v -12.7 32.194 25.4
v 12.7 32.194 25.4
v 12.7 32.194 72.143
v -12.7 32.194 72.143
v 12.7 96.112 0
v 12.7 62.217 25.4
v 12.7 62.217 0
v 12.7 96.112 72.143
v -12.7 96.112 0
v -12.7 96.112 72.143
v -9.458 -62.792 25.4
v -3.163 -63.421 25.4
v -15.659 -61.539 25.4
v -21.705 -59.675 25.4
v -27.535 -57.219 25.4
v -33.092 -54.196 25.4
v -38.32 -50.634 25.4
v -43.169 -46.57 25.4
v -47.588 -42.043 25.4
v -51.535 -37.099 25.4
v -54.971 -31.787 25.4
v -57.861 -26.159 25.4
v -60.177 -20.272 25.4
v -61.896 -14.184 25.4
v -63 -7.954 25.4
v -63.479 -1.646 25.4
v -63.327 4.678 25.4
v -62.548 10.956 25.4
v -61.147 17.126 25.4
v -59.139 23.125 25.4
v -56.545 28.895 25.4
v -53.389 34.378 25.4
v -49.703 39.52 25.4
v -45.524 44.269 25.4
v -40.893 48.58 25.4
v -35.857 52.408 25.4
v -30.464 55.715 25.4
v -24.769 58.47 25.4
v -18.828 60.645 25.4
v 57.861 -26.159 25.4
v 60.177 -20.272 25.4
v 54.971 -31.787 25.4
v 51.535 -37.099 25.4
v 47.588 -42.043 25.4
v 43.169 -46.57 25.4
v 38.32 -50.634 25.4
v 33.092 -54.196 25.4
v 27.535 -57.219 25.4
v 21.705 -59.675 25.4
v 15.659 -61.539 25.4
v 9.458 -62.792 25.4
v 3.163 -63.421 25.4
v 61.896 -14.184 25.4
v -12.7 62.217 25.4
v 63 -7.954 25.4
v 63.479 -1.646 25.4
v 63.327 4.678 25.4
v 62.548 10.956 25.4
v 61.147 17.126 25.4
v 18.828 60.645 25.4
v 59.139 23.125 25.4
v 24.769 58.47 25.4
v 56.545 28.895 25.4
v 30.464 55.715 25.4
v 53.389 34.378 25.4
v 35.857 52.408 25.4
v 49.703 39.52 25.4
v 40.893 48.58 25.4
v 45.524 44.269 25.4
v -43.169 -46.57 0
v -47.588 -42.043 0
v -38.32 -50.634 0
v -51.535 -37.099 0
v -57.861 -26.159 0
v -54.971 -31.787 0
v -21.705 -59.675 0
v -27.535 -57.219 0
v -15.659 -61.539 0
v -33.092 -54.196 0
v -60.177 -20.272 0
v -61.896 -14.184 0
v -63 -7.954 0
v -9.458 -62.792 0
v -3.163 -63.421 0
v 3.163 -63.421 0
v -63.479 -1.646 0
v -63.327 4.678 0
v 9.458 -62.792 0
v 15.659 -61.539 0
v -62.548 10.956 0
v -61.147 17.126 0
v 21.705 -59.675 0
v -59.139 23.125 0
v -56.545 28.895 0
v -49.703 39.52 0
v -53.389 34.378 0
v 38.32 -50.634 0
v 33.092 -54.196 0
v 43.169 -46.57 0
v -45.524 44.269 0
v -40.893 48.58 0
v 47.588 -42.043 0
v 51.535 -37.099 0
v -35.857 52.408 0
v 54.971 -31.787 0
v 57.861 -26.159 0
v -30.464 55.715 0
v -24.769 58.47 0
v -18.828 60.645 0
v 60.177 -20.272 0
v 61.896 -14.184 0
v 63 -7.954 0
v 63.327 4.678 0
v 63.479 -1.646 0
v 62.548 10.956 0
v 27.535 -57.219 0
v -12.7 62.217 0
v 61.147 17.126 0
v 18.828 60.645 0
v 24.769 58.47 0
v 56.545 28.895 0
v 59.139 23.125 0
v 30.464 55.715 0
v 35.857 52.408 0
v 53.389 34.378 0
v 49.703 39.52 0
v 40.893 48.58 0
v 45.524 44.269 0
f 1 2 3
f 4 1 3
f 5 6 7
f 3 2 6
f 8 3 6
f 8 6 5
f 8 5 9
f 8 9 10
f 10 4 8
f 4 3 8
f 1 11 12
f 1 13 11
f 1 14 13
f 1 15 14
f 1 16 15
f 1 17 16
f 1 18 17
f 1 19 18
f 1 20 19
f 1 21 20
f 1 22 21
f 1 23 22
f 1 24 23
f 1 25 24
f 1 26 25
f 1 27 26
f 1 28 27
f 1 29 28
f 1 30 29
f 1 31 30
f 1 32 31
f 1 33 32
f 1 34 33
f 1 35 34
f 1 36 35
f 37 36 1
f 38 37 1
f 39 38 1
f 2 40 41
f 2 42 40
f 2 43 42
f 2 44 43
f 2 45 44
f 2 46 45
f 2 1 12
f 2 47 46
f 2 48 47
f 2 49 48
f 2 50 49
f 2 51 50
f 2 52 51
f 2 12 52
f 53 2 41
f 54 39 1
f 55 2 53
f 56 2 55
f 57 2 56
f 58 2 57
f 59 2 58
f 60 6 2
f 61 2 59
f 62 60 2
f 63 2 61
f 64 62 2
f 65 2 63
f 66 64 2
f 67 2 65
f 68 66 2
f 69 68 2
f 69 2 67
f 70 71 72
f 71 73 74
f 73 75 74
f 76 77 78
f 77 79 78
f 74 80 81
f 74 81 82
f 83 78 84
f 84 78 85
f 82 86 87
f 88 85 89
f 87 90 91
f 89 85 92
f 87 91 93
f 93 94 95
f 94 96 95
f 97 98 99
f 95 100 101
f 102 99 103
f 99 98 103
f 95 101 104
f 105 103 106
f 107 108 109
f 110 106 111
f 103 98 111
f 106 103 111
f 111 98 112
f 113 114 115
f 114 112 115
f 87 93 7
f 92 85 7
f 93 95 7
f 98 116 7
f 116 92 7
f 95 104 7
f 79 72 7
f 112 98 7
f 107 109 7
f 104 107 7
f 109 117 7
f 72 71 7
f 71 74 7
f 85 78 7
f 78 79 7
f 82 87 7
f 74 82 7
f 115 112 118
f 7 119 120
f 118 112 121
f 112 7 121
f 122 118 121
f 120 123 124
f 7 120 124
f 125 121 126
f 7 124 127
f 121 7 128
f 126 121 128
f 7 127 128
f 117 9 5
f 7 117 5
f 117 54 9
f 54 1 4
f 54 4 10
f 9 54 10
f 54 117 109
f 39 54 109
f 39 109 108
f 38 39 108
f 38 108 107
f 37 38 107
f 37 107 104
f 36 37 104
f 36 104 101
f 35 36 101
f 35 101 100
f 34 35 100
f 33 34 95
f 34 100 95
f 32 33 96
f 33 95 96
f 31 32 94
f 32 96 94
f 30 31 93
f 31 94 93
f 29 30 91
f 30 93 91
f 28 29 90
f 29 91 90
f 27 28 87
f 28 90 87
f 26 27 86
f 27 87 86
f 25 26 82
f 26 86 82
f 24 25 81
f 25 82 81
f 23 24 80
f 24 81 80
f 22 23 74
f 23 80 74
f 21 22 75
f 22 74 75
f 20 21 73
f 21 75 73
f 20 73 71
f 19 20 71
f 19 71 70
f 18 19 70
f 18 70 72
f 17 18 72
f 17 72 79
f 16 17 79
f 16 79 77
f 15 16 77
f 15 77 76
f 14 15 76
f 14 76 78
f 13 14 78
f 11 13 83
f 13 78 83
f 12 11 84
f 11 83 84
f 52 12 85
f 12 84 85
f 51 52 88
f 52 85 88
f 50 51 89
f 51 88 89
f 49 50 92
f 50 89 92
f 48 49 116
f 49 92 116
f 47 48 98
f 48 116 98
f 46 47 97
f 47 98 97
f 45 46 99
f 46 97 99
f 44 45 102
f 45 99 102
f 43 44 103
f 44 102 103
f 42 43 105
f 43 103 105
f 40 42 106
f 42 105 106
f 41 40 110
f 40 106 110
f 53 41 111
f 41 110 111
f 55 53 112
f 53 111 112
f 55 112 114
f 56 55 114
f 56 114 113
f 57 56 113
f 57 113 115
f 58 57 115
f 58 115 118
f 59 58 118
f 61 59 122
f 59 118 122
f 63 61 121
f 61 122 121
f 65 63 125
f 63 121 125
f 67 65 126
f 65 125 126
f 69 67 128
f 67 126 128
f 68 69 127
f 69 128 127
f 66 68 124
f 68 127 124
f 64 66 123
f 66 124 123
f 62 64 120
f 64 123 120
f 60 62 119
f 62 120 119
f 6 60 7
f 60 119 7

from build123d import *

# Parameters (mm, degrees)
F0_R     = 63.5
F1_DEPTH = 25.4
F2_W     = 63.917932
F2_H     = 72.142676
F3_DEPTH = 12.7


with BuildPart() as f1:
    # F0 (on Top) → F1 (new body)
    with BuildSketch(Plane.XY):
        Circle(F0_R)
    extrude(amount=F1_DEPTH)

    # F2 (on Right) → F3 (join, symmetric)
    with BuildSketch(Plane.YZ):
        with Locations((64.152928, 36.071338)):
            Rectangle(F2_W, F2_H)
    extrude(amount=F3_DEPTH, both=True)


solid = f1.part
